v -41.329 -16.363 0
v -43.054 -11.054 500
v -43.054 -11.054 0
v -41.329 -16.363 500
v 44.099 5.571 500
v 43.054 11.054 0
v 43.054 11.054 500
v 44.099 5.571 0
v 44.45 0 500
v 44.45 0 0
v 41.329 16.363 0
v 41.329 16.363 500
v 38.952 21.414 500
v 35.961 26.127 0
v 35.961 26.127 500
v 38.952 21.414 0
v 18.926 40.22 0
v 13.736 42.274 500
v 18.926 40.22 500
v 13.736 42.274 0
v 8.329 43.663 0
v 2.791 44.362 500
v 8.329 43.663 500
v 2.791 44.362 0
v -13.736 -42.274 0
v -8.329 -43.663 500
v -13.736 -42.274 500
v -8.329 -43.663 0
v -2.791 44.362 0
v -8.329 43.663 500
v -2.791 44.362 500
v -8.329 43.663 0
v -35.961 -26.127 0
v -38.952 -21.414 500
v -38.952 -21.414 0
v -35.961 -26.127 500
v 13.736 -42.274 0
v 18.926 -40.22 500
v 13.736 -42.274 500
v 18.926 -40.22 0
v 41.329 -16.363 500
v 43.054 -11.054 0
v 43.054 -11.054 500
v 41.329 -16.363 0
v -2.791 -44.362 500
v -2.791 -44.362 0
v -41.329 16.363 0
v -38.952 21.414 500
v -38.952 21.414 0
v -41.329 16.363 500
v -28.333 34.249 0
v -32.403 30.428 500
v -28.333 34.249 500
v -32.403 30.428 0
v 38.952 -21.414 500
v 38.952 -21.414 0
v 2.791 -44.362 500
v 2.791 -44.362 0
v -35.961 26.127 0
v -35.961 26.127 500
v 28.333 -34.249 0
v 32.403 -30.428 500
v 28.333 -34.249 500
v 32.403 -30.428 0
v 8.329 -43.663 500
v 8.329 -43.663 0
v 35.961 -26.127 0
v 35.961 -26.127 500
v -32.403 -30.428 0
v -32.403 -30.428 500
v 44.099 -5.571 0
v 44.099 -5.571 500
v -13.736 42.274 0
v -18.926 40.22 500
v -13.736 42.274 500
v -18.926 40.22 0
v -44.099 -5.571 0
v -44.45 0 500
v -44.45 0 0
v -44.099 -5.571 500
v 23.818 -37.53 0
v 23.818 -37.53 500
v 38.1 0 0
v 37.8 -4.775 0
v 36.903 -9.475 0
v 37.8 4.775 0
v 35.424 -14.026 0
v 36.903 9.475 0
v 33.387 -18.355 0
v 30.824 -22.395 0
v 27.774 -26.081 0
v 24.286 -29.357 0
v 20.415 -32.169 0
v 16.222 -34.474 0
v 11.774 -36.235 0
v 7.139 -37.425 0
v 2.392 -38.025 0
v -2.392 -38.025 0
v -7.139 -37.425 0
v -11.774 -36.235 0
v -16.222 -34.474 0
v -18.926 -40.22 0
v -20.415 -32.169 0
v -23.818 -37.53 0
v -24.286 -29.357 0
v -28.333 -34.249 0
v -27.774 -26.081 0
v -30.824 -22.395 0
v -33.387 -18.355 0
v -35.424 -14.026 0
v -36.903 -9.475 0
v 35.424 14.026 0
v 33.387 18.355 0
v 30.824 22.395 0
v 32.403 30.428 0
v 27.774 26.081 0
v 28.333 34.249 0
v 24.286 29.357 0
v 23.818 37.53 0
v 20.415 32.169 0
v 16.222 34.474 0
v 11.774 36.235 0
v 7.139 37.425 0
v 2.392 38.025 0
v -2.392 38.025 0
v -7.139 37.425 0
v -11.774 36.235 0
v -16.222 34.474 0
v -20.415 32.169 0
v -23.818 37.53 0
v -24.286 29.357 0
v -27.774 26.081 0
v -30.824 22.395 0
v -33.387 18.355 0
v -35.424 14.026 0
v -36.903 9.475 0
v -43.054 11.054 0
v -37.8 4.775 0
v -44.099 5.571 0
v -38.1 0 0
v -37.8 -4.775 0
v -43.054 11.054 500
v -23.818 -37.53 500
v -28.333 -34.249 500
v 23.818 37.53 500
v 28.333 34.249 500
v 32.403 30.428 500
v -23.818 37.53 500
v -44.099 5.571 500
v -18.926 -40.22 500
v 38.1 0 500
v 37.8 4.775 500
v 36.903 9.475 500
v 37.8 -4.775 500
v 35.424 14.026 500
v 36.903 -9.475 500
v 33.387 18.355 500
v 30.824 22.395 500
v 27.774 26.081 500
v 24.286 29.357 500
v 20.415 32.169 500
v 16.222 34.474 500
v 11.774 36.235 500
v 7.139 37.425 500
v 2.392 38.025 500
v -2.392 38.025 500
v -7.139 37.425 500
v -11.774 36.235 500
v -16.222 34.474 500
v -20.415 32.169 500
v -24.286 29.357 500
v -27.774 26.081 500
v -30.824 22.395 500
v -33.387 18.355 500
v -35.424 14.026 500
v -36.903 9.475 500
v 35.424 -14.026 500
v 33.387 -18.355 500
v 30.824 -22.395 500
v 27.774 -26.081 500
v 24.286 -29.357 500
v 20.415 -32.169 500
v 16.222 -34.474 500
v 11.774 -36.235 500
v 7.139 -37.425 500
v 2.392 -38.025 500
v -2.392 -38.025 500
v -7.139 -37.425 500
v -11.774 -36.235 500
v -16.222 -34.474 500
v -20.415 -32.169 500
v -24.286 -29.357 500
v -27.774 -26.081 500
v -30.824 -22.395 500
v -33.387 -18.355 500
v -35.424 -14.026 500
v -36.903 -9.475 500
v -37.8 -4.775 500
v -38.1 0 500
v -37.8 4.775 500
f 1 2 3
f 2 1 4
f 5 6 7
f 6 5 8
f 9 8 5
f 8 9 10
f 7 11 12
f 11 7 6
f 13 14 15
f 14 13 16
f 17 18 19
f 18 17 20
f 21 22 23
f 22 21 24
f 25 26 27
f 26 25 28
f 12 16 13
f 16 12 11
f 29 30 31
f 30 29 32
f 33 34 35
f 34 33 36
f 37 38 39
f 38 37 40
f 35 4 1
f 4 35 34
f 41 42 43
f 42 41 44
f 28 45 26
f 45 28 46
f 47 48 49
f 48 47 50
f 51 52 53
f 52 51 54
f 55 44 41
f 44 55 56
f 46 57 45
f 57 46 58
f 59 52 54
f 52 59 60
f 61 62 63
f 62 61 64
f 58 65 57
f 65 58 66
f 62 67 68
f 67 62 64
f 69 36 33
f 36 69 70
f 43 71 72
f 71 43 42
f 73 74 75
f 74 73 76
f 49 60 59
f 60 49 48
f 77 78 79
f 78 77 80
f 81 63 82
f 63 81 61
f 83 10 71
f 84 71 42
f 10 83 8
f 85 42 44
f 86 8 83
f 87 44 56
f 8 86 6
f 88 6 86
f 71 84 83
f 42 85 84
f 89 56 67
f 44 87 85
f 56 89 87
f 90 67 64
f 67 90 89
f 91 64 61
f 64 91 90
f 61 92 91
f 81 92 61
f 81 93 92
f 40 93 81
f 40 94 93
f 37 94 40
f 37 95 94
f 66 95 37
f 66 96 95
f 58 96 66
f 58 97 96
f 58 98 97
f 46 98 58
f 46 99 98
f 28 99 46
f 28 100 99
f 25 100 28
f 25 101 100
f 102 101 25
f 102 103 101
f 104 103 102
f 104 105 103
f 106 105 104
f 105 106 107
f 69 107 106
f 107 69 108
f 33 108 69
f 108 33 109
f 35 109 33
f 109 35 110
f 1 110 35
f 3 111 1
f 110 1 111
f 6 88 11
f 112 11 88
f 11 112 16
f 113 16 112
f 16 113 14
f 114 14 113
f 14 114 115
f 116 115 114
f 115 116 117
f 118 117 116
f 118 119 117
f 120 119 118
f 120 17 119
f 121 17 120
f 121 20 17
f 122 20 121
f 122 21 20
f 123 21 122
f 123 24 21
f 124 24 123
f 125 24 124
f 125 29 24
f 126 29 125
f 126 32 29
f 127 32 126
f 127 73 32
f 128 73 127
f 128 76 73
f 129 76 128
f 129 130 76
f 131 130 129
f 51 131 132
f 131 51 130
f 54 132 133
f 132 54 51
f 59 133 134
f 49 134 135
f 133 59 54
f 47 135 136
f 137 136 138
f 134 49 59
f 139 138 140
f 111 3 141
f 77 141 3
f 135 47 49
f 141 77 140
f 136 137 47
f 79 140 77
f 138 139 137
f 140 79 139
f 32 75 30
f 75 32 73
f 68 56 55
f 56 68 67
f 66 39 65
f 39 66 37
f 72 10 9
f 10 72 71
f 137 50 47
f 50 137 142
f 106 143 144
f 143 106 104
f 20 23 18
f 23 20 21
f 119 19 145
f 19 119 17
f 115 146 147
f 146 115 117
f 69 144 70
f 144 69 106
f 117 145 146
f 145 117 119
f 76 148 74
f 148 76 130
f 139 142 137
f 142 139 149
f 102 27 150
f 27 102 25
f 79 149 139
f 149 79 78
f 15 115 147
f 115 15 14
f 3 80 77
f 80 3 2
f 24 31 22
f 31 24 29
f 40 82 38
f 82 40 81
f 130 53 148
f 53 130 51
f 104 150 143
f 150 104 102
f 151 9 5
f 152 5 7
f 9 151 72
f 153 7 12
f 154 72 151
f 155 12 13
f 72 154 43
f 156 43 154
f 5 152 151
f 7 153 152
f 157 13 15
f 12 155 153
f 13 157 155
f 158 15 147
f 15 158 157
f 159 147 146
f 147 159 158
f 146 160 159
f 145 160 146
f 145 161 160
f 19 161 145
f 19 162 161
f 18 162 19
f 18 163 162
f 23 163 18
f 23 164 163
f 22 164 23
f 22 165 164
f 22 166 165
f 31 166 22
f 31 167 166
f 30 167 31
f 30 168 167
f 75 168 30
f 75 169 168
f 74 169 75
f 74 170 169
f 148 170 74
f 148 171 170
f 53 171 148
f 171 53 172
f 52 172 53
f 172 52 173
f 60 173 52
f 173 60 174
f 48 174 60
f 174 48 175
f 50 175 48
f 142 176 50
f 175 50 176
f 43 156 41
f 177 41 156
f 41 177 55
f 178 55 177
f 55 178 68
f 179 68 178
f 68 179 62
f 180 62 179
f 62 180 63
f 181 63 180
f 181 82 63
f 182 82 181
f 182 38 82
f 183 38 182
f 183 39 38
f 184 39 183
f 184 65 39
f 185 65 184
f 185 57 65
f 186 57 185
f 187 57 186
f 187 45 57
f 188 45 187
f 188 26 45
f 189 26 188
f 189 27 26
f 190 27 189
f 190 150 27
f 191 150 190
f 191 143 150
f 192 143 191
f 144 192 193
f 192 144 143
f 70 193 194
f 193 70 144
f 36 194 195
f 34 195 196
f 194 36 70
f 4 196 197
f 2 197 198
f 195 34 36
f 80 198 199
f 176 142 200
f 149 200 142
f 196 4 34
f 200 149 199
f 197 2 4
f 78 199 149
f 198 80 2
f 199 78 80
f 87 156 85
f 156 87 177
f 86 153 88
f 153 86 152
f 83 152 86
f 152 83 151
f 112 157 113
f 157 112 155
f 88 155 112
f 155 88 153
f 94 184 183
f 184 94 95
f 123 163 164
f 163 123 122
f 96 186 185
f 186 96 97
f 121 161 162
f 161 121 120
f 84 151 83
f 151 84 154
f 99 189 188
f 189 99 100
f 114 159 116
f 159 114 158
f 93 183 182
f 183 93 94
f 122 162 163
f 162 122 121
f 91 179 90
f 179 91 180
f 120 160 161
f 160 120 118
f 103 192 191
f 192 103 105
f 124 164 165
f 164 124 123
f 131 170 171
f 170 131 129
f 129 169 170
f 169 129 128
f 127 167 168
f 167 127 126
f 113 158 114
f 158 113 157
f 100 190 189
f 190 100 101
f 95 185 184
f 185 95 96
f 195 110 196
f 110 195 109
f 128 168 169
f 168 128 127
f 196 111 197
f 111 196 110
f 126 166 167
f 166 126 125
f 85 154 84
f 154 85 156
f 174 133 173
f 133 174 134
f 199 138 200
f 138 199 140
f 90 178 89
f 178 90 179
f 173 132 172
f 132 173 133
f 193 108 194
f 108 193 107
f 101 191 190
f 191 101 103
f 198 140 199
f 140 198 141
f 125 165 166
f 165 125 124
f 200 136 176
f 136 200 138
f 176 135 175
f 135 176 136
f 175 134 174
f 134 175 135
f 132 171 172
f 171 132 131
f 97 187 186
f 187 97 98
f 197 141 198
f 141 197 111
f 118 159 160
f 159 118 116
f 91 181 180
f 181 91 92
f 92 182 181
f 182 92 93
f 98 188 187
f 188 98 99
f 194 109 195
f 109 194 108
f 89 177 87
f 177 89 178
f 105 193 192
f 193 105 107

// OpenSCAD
module 3_IN_PVC(height = 100){
    color("white")
    difference(){
        cylinder(d=88.9, h=height, $fn=50);
        translate([0,0,-2.5])
        cylinder(d=76.2, h=height+5, $fn=50);
    }
}

3_IN_PVC(500);
